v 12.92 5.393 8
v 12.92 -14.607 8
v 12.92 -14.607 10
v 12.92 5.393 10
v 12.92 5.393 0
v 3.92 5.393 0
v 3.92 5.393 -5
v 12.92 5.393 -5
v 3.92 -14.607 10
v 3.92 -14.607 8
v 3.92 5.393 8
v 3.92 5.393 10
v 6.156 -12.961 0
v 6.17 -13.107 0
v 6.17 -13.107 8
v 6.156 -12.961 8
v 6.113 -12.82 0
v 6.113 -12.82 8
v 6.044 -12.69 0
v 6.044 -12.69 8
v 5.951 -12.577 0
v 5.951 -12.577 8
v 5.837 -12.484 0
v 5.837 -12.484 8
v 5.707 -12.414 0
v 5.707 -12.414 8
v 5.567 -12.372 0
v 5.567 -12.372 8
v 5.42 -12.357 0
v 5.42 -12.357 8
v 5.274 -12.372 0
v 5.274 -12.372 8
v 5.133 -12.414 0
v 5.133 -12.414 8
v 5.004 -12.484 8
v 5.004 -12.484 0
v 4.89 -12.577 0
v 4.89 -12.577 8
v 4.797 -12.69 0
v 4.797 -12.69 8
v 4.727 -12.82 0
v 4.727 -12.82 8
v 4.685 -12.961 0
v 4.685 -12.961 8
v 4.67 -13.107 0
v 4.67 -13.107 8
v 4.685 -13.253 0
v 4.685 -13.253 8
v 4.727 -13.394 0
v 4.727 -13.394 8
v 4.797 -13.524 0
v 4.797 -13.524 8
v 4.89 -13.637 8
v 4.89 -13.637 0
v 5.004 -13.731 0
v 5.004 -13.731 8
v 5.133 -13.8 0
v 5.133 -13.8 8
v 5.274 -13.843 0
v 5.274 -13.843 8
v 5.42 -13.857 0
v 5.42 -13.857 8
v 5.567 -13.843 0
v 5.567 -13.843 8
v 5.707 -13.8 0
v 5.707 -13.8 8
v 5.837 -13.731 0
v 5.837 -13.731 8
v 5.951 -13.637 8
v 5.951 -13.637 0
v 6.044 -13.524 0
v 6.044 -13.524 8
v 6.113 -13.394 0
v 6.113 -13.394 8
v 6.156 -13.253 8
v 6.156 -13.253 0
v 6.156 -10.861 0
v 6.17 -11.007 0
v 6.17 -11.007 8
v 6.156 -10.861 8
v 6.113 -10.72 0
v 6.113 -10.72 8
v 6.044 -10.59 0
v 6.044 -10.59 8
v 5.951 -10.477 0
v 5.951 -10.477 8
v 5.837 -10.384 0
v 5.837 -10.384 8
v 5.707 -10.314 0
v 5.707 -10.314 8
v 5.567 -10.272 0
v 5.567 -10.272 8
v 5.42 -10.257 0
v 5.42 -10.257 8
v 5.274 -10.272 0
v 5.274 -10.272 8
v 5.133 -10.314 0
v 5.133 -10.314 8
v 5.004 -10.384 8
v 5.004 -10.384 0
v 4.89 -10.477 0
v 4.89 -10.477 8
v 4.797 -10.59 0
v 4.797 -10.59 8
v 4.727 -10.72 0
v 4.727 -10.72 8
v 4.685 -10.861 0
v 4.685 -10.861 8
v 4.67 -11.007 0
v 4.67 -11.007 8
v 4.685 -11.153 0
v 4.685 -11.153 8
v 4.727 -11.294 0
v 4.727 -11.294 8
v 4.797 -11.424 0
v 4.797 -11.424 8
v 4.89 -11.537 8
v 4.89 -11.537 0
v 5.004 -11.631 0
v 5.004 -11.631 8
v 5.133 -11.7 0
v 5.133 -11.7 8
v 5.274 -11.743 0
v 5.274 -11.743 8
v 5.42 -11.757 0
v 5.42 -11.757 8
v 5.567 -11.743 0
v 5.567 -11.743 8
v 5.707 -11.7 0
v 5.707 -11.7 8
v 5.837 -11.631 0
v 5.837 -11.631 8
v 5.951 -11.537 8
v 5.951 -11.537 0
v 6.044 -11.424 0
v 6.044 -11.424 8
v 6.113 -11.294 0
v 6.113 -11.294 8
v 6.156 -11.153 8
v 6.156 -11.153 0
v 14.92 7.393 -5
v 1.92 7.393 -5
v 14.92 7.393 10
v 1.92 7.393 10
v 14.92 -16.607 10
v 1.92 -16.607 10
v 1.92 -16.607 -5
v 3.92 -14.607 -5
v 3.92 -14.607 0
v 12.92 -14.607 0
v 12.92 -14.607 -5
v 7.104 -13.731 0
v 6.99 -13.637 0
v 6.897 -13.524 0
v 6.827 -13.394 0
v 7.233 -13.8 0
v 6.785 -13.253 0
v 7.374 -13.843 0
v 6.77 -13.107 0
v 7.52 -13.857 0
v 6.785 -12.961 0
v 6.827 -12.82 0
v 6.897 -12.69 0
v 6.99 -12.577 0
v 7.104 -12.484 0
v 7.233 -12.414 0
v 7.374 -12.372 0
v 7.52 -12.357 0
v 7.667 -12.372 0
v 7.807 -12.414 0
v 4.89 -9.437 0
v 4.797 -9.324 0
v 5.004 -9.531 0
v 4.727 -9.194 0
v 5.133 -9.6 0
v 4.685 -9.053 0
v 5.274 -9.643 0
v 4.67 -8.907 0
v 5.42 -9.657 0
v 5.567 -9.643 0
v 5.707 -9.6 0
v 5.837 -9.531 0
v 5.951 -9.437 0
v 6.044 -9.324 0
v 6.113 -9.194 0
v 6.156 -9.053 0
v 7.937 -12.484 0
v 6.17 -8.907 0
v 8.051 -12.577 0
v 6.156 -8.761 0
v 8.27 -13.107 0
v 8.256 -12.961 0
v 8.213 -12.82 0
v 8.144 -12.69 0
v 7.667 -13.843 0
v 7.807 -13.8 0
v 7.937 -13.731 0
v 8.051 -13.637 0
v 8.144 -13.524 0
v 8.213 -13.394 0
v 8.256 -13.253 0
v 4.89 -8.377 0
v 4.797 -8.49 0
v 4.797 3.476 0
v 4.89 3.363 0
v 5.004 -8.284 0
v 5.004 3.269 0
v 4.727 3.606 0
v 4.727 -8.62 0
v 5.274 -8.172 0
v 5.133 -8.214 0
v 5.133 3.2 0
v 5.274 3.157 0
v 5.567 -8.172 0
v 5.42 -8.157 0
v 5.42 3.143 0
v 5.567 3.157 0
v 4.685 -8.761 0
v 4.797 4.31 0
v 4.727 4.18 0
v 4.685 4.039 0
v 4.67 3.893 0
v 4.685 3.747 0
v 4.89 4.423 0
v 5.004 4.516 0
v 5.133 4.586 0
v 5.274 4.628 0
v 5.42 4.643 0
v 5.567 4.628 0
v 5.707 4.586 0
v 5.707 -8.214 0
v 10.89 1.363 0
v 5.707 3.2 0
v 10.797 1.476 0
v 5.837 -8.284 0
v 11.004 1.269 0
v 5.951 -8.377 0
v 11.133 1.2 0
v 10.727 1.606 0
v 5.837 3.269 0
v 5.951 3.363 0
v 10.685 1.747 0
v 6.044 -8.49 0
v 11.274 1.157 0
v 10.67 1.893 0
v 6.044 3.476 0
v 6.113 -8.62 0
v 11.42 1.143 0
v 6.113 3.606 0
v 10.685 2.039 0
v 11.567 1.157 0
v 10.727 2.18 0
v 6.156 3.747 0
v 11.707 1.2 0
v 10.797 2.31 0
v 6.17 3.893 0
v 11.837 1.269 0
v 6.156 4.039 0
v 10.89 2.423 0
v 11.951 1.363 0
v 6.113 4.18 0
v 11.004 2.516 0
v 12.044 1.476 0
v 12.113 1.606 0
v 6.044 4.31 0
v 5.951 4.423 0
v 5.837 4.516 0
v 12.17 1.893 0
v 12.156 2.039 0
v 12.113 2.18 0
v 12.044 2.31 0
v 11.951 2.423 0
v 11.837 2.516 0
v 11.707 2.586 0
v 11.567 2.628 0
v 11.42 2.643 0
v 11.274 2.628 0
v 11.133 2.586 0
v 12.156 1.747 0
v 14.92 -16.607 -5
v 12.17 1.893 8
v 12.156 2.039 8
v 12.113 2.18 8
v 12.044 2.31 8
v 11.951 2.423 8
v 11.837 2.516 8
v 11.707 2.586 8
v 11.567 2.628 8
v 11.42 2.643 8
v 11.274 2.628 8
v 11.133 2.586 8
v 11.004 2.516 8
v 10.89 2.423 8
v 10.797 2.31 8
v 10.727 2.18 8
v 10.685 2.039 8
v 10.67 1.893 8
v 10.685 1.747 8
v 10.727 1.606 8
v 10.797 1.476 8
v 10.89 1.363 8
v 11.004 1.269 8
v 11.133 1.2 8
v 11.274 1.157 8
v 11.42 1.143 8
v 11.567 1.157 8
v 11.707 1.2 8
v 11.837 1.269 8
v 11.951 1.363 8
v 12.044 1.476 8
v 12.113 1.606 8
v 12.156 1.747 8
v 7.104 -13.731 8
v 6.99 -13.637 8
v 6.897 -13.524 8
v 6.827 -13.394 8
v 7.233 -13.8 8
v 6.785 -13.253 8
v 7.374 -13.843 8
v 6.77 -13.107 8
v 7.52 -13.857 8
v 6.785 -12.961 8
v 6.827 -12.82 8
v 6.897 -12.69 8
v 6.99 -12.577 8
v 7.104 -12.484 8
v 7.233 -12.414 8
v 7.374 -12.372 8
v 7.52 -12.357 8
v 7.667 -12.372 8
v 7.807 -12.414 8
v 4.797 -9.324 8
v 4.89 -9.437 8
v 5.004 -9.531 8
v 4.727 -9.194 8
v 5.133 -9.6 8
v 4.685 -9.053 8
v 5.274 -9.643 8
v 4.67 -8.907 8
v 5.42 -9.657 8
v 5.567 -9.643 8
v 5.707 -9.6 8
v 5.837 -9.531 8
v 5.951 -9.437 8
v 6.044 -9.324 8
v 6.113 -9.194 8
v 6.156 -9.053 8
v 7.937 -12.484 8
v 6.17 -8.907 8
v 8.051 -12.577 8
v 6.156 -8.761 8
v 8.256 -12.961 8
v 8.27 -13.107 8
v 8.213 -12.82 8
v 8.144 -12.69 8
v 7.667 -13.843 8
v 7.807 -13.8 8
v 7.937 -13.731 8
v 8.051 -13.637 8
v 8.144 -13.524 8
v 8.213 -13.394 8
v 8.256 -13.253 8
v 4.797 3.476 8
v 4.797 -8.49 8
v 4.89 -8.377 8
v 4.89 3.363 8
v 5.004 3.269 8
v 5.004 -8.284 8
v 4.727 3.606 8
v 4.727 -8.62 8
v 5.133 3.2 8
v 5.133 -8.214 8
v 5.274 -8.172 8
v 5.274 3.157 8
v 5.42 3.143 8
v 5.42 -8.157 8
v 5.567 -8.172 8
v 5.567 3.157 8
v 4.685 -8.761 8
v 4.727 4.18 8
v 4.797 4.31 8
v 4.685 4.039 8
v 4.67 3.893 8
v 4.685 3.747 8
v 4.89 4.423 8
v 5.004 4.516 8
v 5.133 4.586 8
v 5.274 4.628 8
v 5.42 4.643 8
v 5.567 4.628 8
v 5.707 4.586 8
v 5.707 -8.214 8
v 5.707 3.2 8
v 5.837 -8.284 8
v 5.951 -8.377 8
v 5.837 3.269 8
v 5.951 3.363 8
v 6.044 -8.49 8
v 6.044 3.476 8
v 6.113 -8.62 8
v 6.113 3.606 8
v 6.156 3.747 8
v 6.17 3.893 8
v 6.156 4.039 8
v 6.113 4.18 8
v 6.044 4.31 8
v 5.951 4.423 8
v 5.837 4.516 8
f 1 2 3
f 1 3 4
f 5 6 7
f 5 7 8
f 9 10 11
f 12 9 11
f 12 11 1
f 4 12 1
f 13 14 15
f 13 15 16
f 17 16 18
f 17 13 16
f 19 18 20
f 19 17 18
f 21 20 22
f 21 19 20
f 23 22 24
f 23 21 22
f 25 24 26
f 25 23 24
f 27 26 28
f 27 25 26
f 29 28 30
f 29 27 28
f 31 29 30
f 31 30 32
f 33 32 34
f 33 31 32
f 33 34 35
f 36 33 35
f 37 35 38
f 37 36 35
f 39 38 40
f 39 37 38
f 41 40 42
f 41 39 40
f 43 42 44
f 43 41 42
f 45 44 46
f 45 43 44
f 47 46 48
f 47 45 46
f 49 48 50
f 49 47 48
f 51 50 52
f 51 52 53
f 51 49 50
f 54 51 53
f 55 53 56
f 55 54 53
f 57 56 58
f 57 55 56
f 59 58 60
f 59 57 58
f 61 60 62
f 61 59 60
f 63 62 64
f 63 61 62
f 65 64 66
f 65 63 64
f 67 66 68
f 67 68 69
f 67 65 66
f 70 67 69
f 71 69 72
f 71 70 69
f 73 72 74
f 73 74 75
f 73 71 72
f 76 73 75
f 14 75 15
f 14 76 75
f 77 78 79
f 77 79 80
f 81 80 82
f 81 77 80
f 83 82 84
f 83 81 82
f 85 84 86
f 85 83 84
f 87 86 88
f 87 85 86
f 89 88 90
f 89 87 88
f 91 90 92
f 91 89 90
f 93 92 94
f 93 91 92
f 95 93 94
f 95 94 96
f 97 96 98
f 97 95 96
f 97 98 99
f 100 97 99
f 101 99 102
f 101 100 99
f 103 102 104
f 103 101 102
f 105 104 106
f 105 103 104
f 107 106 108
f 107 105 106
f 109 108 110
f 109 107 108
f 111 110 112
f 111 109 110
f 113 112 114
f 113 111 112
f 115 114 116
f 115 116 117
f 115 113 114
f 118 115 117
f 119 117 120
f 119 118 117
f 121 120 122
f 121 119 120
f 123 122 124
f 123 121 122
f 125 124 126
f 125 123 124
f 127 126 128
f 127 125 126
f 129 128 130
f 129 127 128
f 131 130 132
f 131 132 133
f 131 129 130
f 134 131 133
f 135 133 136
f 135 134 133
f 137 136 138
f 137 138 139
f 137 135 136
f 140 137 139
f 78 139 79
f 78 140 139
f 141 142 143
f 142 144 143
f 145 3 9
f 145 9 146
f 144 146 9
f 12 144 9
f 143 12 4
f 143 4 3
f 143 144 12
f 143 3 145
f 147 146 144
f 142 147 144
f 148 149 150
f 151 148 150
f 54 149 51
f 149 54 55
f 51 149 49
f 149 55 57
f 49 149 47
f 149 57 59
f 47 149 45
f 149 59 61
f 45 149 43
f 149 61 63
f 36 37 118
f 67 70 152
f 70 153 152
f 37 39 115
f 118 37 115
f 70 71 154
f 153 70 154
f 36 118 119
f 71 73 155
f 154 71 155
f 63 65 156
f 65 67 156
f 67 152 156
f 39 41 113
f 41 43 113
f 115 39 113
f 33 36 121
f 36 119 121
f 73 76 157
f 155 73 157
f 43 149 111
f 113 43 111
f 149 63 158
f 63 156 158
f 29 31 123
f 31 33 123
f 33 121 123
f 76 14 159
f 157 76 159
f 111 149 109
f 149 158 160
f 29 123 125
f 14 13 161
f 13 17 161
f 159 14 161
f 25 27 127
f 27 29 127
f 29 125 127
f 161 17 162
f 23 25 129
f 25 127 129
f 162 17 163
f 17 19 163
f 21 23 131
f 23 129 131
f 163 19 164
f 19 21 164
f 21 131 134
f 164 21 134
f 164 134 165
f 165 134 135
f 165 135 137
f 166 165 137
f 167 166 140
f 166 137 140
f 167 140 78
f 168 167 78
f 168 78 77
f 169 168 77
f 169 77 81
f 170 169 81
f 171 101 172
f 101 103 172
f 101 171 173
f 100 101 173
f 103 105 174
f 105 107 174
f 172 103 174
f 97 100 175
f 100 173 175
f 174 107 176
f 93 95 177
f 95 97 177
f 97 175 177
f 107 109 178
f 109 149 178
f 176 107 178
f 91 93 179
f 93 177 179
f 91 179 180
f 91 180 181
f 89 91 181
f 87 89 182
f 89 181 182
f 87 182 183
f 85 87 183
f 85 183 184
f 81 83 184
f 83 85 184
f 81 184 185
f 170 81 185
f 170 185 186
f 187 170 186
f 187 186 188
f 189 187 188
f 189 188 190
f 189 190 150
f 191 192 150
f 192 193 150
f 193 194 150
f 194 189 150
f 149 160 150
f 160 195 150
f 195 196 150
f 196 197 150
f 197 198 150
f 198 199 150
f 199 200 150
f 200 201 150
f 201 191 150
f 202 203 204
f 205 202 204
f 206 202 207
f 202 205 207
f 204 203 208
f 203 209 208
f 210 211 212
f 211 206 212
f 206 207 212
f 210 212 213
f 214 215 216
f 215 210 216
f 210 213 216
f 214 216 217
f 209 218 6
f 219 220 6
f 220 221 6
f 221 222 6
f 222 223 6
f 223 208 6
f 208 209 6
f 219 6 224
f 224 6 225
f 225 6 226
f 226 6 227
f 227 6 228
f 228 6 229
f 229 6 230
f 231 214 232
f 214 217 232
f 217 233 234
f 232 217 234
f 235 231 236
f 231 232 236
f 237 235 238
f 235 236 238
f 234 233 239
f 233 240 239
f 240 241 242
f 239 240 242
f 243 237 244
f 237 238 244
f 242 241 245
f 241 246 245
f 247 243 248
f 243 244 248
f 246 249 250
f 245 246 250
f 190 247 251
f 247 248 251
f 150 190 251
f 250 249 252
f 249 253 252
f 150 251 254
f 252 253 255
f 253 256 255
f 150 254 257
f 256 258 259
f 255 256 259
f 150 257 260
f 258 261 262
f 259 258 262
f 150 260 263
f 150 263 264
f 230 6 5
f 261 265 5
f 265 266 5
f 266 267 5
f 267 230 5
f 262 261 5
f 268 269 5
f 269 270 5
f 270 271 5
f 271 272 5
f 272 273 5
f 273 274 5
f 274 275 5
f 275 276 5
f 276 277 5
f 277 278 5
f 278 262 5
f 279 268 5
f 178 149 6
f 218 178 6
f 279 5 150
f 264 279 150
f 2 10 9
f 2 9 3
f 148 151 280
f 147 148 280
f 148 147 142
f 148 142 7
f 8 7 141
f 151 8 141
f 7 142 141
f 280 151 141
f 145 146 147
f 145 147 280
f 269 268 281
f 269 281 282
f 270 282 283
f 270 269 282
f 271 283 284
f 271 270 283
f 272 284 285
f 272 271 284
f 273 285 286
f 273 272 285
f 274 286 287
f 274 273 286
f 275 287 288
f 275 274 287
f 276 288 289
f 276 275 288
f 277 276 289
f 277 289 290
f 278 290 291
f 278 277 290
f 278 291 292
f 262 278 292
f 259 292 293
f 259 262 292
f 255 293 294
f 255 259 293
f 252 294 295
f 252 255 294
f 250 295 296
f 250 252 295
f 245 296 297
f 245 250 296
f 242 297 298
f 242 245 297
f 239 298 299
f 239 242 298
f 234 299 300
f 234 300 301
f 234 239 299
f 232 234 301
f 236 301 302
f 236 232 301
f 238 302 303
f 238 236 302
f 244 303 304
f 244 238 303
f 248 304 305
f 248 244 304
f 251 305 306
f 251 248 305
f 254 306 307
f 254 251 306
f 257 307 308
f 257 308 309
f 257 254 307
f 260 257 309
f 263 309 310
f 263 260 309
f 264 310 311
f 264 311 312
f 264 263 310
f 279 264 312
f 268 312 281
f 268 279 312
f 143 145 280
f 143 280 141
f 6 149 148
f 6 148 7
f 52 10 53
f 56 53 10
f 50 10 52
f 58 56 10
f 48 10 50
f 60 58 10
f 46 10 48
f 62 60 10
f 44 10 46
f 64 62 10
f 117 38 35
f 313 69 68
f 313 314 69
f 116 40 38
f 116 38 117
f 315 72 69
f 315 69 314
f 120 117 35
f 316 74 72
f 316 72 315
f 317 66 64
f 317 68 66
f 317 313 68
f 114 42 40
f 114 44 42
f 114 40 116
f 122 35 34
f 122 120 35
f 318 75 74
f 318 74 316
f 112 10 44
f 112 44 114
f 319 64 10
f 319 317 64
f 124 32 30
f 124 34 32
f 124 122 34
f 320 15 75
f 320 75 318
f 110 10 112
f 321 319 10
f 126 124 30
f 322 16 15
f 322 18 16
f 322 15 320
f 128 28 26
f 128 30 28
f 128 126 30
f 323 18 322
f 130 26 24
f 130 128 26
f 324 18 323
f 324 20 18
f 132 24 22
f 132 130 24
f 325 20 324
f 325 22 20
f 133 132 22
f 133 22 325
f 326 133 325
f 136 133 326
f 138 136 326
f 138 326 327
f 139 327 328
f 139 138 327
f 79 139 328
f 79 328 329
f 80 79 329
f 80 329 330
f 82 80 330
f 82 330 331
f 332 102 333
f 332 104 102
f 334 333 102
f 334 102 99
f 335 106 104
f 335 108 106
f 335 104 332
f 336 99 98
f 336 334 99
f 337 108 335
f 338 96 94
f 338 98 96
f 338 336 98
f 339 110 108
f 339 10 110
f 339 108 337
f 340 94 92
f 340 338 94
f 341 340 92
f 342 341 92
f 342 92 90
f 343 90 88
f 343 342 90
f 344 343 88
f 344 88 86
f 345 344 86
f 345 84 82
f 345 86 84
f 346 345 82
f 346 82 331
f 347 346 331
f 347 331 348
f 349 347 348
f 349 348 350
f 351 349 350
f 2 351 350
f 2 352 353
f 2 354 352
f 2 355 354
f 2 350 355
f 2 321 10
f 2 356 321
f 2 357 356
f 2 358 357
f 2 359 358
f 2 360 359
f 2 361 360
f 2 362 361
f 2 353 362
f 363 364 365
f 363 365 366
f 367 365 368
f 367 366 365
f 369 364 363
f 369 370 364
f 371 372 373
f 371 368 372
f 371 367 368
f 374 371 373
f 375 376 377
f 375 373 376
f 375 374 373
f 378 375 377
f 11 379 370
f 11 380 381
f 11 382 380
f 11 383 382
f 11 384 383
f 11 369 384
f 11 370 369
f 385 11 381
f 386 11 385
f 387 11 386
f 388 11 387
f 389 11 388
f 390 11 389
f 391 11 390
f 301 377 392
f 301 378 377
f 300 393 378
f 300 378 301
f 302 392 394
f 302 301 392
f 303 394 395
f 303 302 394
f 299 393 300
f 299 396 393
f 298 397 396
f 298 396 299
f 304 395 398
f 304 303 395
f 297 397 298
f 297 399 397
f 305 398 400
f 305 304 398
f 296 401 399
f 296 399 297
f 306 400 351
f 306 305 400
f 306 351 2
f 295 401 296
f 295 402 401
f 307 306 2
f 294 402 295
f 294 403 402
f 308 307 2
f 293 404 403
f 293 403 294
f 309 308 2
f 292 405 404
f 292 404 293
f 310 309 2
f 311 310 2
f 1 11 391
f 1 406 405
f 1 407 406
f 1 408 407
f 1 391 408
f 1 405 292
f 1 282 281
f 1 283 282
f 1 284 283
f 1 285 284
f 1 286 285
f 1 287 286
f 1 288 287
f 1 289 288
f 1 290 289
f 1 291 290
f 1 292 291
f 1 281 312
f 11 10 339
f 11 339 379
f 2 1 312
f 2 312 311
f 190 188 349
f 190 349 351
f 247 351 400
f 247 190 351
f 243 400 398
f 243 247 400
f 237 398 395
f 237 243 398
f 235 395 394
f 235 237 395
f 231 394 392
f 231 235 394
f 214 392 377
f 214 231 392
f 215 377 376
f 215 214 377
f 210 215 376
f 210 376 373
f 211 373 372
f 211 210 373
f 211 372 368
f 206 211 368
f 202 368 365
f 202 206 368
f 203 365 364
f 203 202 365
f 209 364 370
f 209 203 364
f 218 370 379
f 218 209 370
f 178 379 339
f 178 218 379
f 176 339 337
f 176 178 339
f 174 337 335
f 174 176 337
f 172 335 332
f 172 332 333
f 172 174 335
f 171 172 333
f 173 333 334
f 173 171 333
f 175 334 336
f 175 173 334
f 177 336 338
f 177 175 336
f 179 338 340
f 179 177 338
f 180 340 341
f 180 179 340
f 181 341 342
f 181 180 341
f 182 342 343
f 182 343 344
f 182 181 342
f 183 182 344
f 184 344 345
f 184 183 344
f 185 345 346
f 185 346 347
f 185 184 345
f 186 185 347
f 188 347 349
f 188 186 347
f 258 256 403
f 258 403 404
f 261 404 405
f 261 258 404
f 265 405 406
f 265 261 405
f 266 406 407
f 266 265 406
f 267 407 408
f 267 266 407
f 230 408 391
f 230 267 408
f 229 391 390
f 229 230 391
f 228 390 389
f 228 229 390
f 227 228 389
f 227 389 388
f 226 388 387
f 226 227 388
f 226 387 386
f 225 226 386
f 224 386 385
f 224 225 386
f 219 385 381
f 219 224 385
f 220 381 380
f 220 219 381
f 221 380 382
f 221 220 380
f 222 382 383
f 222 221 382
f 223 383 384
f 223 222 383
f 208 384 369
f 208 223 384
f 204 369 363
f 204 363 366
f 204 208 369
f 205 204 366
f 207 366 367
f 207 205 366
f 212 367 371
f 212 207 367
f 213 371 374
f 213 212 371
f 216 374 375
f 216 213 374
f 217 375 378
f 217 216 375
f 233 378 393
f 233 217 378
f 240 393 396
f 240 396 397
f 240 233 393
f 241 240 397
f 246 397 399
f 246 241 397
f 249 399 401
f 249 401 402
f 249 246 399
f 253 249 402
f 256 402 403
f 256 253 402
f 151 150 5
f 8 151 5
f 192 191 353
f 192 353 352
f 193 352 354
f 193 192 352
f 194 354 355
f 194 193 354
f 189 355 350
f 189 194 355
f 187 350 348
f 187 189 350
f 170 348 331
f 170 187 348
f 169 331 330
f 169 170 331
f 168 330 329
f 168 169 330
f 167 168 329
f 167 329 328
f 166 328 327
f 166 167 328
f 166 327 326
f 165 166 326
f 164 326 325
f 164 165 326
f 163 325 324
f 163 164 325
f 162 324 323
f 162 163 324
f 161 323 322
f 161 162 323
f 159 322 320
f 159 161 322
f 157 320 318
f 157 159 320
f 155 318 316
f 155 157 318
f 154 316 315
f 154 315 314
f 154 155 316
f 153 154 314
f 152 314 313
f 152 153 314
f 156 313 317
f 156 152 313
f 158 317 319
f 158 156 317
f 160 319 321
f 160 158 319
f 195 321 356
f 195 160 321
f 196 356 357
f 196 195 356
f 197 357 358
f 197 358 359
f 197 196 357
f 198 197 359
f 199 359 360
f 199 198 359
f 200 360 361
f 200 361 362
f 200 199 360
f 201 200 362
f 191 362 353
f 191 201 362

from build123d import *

# Parameters (mm, degrees)
F0_W     = 13
F0_H     = 24
F0_W_2   = 9
F0_H_2   = 20
F1_DEPTH = 10
F0_R     = 0.75
F2_DEPTH = 8
F3_DEPTH = 5


with BuildPart() as f1:
    # F0 (on Top) → F1 (new body)
    with BuildSketch(Plane.XY):
        with Locations((8.4202193944, -4.6071633101)):
            Rectangle(F0_W, F0_H)
        with Locations((8.4202193944, -4.6071633101)):
            Rectangle(F0_W_2, F0_H_2, mode=Mode.SUBTRACT)
    extrude(amount=F1_DEPTH)

    # F0 (on Top) → F2 (join)
    with BuildSketch(Plane.XY):
        with Locations((8.4202193944, -4.6071633101)):
            Rectangle(F0_W, F0_H)
        with Locations((8.4202193944, -4.6071633101)):
            Rectangle(F0_W_2, F0_H_2, mode=Mode.SUBTRACT)
        with Locations((8.4202193944, -4.6071633101)):
            Rectangle(F0_W_2, F0_H_2)
        with Locations((5.4202193944, -13.1071633101)):
            Circle(F0_R, mode=Mode.SUBTRACT)
        with Locations((5.4202193944, -11.0071633101)):
            Circle(F0_R, mode=Mode.SUBTRACT)
        with Locations((7.5202193944, -13.1071633101)):
            Circle(F0_R, mode=Mode.SUBTRACT)
        with Locations((5.4202193944, -8.9071633101)):
            Circle(F0_R, mode=Mode.SUBTRACT)
        with Locations((5.4202193944, 3.8928366899)):
            Circle(F0_R, mode=Mode.SUBTRACT)
        with Locations((11.4202193944, 1.8928366899)):
            Circle(F0_R, mode=Mode.SUBTRACT)
    extrude(amount=F2_DEPTH)

    # F0 (on Top) → F3 (join)
    with BuildSketch(Plane.XY):
        with Locations((8.4202193944, -4.6071633101)):
            Rectangle(F0_W, F0_H)
        with Locations((8.4202193944, -4.6071633101)):
            Rectangle(F0_W_2, F0_H_2, mode=Mode.SUBTRACT)
    extrude(amount=-F3_DEPTH)


solid = f1.part
